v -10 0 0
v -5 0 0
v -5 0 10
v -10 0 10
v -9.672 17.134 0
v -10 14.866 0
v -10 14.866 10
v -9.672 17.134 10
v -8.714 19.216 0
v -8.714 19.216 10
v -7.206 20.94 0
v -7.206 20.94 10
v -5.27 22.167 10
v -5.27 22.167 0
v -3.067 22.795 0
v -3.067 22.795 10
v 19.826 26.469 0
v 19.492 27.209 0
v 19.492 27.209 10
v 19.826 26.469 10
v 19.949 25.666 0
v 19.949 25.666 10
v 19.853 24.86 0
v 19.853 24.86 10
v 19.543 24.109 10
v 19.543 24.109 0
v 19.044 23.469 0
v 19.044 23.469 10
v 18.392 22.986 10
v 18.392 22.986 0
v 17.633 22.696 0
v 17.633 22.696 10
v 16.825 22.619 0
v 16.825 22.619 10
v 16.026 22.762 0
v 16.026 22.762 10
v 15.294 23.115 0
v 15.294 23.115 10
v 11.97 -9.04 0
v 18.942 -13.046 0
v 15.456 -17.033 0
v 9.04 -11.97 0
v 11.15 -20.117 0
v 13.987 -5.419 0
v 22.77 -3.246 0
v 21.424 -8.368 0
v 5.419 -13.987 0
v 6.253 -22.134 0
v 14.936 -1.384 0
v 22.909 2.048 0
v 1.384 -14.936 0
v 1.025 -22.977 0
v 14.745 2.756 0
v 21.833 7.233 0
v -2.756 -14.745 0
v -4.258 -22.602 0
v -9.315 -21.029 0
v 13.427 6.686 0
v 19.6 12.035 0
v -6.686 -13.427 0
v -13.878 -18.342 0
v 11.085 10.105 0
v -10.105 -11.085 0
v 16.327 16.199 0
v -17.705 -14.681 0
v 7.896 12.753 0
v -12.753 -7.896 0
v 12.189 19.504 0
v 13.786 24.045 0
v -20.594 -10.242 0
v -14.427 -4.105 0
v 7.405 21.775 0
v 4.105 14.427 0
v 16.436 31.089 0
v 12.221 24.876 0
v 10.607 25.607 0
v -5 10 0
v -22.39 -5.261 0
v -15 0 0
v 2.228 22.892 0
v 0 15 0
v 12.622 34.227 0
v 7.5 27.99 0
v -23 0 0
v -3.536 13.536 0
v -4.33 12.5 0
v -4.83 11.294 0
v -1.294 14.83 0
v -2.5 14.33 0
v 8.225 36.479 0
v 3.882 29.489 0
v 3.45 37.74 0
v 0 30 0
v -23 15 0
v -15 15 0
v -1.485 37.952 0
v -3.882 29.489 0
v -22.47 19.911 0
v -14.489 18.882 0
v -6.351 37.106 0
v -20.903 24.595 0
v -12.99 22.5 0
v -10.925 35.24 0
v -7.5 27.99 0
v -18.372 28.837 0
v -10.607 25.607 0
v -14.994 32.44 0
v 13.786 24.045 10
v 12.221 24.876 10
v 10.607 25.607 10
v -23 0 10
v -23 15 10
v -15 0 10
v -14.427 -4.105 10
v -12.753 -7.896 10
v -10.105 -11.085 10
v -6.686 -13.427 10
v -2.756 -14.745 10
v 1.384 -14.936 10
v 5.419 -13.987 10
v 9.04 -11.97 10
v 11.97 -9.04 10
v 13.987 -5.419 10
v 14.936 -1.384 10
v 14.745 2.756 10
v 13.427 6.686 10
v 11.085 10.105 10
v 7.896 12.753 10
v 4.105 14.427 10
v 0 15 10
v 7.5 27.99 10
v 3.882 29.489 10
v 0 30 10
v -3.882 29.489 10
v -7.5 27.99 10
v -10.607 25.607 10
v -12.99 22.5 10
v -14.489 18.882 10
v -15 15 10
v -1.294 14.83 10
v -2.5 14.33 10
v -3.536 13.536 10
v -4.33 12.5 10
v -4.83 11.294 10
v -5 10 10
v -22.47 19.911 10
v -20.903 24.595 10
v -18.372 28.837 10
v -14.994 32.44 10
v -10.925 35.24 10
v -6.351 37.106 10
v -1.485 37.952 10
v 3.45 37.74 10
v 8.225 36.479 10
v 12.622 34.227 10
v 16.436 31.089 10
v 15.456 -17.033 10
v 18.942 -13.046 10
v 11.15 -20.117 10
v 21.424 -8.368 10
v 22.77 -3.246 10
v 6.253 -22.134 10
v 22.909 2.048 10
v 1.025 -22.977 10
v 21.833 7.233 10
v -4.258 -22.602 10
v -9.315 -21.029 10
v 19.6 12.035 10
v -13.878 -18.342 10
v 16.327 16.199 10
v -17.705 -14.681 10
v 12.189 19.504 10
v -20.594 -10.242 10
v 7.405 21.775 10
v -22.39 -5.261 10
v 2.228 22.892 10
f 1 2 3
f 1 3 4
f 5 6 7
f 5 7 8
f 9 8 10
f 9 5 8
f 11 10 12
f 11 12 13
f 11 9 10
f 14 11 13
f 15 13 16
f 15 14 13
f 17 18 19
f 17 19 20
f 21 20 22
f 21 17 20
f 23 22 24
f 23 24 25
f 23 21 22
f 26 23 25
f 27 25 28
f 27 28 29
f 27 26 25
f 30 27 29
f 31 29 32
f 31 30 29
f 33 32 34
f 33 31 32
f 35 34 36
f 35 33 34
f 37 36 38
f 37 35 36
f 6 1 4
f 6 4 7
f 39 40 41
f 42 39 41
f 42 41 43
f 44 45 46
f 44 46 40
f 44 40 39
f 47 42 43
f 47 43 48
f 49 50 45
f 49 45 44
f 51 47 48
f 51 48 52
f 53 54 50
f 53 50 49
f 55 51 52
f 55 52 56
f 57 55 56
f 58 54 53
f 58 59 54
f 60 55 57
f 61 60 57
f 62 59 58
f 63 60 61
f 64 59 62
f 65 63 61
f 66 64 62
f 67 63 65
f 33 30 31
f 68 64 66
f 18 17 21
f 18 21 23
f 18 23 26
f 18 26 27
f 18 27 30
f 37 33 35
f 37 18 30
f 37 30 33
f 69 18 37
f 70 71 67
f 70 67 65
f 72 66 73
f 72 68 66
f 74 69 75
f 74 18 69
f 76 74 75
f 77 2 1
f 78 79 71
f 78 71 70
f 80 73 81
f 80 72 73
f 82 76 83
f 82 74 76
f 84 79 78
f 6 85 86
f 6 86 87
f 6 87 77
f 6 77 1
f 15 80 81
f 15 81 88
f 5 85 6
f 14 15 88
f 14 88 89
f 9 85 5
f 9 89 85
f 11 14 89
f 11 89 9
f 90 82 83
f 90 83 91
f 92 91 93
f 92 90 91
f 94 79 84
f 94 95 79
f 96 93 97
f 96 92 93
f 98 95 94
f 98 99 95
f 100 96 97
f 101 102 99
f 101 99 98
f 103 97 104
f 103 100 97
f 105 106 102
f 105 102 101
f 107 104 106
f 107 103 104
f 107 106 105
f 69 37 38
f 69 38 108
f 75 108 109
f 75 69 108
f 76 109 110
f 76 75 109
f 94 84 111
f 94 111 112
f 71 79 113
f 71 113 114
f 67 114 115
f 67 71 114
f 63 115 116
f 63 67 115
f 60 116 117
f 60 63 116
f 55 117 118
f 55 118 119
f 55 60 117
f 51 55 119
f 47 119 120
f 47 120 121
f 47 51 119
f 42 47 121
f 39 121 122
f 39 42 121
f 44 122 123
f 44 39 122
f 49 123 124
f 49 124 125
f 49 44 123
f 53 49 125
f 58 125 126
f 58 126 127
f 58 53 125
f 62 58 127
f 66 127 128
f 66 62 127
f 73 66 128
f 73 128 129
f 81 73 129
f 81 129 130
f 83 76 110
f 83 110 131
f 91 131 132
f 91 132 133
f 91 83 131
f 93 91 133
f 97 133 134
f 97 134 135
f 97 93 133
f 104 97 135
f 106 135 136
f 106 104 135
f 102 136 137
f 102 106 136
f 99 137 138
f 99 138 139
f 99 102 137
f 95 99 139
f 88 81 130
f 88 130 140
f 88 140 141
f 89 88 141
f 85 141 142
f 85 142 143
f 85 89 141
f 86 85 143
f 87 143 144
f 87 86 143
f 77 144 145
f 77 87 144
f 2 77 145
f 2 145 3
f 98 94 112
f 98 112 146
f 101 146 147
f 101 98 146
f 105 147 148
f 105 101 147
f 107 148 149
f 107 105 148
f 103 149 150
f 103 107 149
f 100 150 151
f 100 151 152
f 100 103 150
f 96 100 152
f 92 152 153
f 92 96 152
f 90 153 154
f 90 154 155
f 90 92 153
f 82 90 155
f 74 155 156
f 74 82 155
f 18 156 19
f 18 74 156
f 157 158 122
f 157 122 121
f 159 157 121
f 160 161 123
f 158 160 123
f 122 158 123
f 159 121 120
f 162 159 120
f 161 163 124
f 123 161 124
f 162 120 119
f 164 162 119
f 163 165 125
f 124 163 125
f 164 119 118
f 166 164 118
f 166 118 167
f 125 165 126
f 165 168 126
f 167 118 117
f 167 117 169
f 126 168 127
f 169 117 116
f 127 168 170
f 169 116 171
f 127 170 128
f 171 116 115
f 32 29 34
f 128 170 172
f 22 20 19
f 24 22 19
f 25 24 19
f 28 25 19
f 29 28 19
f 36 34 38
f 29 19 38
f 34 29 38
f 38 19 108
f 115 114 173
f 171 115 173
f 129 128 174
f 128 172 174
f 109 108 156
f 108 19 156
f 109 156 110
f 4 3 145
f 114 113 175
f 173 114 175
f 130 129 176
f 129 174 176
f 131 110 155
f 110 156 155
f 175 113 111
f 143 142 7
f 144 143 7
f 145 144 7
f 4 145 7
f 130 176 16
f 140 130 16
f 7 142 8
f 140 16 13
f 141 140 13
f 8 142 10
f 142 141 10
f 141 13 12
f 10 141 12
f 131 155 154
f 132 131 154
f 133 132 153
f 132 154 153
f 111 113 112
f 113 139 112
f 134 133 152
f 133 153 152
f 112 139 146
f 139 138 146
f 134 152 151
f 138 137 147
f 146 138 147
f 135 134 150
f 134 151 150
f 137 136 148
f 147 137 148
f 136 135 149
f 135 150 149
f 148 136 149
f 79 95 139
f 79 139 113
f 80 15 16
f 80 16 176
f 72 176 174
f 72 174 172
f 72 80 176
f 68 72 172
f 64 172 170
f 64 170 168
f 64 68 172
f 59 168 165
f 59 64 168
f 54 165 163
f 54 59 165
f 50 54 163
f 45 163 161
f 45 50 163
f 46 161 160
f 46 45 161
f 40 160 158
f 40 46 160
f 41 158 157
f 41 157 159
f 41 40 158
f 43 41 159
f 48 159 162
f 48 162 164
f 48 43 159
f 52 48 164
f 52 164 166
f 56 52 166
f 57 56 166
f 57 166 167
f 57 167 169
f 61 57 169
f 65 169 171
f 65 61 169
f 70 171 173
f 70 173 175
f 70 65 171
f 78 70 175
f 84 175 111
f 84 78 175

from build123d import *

# Parameters (mm, degrees)
BOSS_EXTRUDE1_DEPTH = 10


with BuildPart() as part:
    # Sketch1 → Boss-Extrude1 (new body)
    with BuildSketch(Plane.XY):
        with BuildLine():
            Line((-23, 0), (-23, 15))
            ThreePointArc((-23, 15), (-6.351498428, 37.105620727), (19.492040672, 27.209027416))
            ThreePointArc((19.492040672, 27.209027416), (19.044286348, 23.468920949), (15.294171401, 23.114635465))
            ThreePointArc((15.294171401, 23.114635465), (13.010187777, 24.473109029), (10.606601718, 25.606601718))
            ThreePointArc((10.606601718, 25.606601718), (-5.740251485, 28.858192988), (-15, 15))
            Line((-15, 15), (-15, 0))
            ThreePointArc((-15, 0), (10.606601718, -10.606601718), (0, 15))
            ThreePointArc((0, 15), (-3.535533906, 13.535533906), (-5, 10))
            Line((-5, 10), (-5, 0))
            Line((-5, 0), (-10, 0))
            Line((-10, 0), (-10, 11.180339887))
            Line((-10, 11.180339887), (-10, 14.866068747))
            ThreePointArc((-10, 14.866068747), (-8.022181222, 20.132313456), (-3.066666667, 22.794638746))
            ThreePointArc((-3.066666667, 22.794638746), (17.313771012, -15.140453538), (-23, 0))
        make_face()
    extrude(amount=BOSS_EXTRUDE1_DEPTH)


solid = part.part
